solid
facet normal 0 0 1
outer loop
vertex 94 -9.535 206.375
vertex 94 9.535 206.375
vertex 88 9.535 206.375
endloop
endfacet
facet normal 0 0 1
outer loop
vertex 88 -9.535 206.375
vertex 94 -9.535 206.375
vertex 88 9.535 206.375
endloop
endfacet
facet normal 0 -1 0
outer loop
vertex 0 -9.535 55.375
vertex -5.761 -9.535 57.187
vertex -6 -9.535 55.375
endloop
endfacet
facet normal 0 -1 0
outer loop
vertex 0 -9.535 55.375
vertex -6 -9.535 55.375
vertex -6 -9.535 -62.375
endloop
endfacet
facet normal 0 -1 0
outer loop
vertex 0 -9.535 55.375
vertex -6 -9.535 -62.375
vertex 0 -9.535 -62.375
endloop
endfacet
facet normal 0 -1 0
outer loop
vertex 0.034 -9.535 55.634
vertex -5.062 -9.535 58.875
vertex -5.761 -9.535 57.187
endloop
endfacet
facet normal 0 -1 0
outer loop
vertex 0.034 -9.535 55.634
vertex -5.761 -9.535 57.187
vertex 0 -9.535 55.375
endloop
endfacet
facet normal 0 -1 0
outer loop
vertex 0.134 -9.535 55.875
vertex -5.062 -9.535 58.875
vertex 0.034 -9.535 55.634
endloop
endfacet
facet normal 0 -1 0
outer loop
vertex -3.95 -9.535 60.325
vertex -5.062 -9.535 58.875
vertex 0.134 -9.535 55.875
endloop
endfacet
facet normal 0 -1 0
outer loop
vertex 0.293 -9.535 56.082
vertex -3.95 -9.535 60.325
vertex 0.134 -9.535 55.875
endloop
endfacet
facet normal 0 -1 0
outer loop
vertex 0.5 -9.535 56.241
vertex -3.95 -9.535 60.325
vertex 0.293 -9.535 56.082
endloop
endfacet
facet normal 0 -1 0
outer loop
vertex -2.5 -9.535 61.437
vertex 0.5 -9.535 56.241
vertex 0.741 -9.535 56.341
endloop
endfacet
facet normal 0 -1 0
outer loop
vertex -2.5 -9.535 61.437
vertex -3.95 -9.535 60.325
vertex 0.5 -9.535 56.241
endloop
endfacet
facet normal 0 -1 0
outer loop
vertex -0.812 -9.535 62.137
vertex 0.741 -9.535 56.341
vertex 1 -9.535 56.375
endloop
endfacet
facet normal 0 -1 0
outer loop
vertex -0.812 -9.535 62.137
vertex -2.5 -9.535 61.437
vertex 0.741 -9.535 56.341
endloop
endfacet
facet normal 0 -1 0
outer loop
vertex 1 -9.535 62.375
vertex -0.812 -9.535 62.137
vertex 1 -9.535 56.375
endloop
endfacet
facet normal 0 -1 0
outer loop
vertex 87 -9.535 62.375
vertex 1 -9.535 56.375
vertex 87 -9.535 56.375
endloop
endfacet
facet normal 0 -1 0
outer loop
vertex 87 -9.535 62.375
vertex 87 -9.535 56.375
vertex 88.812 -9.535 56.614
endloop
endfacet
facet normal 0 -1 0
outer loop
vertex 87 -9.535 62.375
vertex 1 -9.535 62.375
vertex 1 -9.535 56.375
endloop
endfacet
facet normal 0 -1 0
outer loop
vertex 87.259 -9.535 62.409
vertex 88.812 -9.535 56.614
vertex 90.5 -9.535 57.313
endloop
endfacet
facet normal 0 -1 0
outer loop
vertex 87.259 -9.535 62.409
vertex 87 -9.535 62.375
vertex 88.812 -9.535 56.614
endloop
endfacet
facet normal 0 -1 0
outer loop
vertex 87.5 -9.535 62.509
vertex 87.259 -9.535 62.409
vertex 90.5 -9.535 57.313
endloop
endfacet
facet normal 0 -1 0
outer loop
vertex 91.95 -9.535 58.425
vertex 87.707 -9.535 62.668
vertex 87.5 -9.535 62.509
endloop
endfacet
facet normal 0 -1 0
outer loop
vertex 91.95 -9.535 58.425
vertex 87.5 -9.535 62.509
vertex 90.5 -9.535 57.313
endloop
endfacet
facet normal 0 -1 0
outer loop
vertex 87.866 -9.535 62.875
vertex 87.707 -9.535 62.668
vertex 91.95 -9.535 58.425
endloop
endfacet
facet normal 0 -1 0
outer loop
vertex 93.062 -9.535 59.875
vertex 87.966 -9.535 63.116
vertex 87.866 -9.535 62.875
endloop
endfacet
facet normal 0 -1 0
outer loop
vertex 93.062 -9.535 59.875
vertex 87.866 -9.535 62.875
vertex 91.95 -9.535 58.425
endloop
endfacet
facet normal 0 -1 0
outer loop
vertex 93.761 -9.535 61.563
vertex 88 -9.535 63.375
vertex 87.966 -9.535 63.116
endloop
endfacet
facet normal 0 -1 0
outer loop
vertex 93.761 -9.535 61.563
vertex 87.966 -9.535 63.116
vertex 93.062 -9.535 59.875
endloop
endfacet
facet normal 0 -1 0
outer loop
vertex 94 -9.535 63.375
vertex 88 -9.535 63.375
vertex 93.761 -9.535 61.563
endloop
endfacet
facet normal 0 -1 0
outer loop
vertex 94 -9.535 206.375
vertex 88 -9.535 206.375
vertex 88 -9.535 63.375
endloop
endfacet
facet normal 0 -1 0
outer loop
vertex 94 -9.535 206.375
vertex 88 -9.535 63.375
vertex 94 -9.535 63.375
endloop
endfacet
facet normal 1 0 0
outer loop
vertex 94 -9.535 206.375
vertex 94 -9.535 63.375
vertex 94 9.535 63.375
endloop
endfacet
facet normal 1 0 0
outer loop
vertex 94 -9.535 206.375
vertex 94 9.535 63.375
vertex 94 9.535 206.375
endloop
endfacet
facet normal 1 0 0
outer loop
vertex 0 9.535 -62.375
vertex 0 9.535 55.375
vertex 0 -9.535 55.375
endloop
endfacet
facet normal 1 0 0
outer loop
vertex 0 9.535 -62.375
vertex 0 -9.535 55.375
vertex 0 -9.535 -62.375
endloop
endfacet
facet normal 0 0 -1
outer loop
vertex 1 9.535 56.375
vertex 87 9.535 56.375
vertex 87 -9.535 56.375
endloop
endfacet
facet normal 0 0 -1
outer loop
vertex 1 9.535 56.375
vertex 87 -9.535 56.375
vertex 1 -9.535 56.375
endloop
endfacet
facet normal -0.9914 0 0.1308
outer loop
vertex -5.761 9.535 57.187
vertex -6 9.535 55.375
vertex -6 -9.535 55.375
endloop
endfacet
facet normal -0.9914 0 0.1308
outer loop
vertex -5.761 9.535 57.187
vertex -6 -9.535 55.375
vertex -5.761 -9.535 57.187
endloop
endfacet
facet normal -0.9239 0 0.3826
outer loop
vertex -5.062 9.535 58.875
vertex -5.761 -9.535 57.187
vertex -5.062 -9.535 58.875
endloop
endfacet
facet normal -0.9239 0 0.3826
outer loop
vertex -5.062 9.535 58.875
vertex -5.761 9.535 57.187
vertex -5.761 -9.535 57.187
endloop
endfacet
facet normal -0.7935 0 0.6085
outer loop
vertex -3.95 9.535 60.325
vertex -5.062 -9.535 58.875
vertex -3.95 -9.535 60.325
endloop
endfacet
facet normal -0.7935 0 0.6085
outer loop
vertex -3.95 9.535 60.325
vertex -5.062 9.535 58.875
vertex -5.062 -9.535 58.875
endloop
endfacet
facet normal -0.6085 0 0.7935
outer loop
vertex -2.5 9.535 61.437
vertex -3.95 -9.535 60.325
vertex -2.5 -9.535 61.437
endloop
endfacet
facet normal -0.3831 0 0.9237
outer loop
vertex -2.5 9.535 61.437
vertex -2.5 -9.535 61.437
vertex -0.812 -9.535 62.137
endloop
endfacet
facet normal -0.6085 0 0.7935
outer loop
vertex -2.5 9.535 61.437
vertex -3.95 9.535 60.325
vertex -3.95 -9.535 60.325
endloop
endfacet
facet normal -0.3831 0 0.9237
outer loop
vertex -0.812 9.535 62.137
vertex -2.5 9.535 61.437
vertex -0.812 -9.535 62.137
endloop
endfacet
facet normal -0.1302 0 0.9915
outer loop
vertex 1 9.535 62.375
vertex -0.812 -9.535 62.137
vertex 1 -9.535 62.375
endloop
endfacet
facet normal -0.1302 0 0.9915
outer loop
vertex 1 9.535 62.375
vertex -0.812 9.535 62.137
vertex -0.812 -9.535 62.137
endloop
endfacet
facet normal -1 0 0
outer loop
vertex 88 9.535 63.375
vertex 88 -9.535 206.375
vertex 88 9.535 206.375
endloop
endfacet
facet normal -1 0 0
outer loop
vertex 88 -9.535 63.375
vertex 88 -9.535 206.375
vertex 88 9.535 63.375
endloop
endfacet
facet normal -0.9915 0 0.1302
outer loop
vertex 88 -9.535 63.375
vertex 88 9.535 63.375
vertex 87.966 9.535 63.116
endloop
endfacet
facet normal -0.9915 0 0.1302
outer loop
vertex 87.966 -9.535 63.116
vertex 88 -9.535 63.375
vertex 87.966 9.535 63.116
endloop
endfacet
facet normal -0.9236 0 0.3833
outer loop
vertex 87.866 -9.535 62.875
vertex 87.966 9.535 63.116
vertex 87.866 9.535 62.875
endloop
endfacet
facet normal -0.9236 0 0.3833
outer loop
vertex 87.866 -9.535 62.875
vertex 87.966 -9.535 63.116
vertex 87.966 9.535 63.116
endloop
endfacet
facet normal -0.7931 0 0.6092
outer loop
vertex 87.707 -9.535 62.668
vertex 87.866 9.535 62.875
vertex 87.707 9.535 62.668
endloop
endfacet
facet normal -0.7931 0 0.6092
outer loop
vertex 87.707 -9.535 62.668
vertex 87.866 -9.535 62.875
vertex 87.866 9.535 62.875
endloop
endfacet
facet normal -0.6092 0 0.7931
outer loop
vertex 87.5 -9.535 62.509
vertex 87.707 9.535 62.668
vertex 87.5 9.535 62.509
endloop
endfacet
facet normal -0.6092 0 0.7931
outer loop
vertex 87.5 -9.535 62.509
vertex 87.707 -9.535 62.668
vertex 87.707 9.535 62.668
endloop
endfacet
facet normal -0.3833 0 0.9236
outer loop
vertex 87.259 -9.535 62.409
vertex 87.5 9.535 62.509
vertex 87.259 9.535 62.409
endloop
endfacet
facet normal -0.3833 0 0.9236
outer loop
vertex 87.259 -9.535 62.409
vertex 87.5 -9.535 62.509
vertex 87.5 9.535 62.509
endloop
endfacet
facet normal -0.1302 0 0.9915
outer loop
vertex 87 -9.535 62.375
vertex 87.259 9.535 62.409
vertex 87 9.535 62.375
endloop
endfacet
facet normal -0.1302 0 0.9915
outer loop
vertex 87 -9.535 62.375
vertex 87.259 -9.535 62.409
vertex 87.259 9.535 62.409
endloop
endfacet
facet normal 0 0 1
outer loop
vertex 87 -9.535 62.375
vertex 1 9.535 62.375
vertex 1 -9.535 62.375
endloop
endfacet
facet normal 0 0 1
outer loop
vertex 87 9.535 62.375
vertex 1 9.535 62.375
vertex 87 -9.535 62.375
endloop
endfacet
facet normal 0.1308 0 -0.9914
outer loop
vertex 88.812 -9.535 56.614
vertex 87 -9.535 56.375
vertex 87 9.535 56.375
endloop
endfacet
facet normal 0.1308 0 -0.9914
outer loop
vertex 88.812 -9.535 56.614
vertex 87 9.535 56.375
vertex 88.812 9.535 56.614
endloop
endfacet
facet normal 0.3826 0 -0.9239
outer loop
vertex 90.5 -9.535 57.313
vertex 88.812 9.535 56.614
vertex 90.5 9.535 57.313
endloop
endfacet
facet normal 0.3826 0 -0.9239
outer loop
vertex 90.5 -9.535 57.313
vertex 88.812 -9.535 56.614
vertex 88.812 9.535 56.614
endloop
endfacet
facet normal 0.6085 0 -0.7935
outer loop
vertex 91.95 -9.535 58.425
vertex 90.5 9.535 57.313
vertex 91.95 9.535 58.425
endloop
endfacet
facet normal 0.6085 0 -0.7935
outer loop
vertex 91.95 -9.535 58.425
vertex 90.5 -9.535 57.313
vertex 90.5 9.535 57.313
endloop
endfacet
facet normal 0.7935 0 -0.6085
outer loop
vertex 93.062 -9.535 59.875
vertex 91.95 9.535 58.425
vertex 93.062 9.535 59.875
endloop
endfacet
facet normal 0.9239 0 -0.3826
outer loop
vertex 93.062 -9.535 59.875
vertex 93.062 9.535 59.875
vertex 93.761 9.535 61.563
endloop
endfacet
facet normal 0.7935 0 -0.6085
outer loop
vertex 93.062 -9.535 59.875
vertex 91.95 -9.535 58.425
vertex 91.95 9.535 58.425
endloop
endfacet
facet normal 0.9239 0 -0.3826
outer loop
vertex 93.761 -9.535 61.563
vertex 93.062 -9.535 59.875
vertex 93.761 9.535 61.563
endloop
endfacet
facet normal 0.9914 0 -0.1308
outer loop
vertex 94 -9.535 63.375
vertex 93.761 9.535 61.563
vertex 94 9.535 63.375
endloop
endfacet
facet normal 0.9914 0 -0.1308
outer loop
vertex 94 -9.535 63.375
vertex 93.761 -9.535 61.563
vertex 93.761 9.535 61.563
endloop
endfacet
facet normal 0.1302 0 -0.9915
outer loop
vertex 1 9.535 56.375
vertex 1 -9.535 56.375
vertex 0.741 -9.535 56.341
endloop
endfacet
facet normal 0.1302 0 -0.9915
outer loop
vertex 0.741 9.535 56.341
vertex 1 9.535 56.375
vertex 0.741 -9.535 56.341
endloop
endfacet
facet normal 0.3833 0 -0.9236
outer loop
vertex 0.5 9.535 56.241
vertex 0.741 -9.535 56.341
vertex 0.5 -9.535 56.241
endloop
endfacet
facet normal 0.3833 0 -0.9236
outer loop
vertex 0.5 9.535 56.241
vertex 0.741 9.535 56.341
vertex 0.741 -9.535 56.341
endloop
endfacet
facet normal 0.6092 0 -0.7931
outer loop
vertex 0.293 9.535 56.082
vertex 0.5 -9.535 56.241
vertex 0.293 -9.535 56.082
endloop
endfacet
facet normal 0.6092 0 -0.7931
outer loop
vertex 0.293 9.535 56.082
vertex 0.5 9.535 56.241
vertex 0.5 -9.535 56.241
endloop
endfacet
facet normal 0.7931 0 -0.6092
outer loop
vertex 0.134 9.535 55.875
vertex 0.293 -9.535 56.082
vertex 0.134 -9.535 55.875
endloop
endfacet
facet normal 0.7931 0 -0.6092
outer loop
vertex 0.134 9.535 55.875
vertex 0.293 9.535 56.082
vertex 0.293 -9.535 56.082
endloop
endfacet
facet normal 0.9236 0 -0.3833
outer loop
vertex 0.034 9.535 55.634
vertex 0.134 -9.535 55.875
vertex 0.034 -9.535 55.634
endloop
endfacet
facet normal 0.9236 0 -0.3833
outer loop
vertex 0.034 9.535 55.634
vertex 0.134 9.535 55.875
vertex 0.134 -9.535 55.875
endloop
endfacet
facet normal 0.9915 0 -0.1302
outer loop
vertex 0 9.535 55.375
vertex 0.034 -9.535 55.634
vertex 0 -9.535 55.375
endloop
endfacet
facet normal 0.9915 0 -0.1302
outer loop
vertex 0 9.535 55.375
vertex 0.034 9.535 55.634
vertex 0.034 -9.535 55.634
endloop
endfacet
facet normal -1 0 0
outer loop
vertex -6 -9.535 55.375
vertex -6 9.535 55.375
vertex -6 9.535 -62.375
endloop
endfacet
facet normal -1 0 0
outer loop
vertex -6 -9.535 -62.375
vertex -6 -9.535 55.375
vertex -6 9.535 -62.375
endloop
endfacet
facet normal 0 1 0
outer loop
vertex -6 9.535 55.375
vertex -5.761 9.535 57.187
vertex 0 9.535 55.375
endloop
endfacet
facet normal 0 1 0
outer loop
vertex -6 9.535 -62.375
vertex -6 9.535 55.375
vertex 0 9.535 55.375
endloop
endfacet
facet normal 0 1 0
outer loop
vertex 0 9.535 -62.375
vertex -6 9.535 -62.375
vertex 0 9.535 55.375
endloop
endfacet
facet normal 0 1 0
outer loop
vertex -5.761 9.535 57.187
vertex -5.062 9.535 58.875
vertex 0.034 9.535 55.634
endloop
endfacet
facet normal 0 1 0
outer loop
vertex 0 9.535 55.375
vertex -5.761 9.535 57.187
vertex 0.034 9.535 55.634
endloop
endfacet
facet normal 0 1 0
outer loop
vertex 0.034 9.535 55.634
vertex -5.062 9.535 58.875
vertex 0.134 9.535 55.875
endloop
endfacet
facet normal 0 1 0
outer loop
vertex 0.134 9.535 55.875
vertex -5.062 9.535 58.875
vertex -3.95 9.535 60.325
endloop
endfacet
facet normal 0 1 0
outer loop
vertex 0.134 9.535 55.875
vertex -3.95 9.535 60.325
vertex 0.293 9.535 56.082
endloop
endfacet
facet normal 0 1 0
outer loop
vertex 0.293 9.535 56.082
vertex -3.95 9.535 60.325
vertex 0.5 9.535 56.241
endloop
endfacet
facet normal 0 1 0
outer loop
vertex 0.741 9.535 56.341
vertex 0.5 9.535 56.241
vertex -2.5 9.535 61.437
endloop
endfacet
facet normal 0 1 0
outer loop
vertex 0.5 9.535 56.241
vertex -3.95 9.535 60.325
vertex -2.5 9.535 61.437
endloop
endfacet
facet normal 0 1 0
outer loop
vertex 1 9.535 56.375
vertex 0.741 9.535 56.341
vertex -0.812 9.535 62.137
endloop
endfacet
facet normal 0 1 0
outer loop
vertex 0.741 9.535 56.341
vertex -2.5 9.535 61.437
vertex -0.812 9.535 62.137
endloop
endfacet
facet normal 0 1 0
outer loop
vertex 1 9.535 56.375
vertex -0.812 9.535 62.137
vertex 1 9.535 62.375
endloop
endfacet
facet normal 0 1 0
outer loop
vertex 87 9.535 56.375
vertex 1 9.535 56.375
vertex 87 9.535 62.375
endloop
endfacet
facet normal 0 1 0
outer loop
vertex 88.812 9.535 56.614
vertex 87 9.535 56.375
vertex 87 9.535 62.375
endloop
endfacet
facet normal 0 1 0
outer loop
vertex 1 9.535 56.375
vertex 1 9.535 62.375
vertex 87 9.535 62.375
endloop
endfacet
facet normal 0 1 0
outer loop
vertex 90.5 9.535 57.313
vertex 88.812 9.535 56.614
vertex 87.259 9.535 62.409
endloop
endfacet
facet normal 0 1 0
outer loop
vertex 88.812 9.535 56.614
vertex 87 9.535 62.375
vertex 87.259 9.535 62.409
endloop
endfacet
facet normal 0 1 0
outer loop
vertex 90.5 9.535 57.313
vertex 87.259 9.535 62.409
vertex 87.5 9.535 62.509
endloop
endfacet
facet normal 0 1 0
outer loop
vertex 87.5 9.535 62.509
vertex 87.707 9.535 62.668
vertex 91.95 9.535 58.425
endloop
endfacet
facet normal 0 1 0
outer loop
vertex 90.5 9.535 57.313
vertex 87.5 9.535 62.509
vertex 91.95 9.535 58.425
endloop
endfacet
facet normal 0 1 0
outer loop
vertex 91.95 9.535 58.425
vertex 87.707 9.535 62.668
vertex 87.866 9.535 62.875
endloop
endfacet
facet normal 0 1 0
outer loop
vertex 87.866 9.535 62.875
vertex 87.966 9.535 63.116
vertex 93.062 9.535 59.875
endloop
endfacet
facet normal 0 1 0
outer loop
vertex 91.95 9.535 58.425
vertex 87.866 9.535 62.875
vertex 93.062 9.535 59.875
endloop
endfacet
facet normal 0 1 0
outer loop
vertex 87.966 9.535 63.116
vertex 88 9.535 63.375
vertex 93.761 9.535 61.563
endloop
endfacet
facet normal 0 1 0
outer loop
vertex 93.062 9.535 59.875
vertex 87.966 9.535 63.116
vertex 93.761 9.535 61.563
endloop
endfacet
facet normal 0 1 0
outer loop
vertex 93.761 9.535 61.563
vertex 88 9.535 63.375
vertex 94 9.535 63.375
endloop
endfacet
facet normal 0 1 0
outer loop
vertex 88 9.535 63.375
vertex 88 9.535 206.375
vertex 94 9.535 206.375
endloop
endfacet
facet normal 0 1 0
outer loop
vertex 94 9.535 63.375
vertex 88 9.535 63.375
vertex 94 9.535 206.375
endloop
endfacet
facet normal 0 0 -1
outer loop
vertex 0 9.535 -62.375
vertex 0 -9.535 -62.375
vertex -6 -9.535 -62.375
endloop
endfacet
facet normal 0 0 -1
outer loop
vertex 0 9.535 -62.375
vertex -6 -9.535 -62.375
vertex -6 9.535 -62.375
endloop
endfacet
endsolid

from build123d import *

# Parameters (mm, degrees)
SKETCH1_W                    = 124.750351958
SKETCH1_H                    = 19.070117496
BASE_FLANGE1_DEPTH           = 6
EDGE_FLANGE1_STRIP_W         = 26
EDGE_FLANGE1_STRIP_H         = 6
EDGE_FLANGE1_STRIP_CUT_DEPTH = 19.070117497
EDGE_FLANGE1_DEPTH           = 19.070117497
EDGE_FLANGE2_STRIP_W         = 26
EDGE_FLANGE2_STRIP_H         = 6
EDGE_FLANGE2_STRIP_CUT_DEPTH = 19.070117497
EDGE_FLANGE2_DEPTH           = 19.070117497


# Sheet-metal steps are written as plain solids
with BuildPart() as part:
    # Sketch1 → Base-Flange1 (new body)
    with BuildSketch(Plane(origin=(0, 0, 0), x_dir=(0, 0, -1), z_dir=(1, 0, 0))):
        Rectangle(SKETCH1_W, SKETCH1_H)
    extrude(amount=-BASE_FLANGE1_DEPTH)

    # Edge-Flange1 strip (across the edge) → Edge-Flange1 strip cut (cut)
    with BuildSketch(Plane(origin=(0, 9.535058748, 62.375175979), x_dir=(0, 0, -1), z_dir=(0, -1, 0))):
        with Locations((-6, -3)):
            Rectangle(EDGE_FLANGE1_STRIP_W, EDGE_FLANGE1_STRIP_H)
    extrude(amount=EDGE_FLANGE1_STRIP_CUT_DEPTH, mode=Mode.SUBTRACT)

    # Edge-Flange1 section (across the edge) → Edge-Flange1 (add)
    with BuildSketch(Plane(origin=(0, 9.535058748, 62.375175979), x_dir=(0, 0, -1), z_dir=(0, -1, 0))):
        with BuildLine():
            Line((0, 1), (0, 94))
            Line((0, 94), (6, 94))
            Line((6, 94), (6, 1))
            ThreePointArc((6, 1), (6.292893219, 0.292893219), (7, 0))
            Line((7, 0), (7, -6))
            ThreePointArc((7, -6), (2.050252532, -3.949747468), (0, 1))
        make_face()
    extrude(amount=EDGE_FLANGE1_DEPTH)

    # Edge-Flange2 strip (across the edge) → Edge-Flange2 strip cut (cut)
    with BuildSketch(Plane(origin=(94, -9.535058748, 62.375175979), x_dir=(-1, 0, 0), z_dir=(0, 1, 0))):
        with Locations((-6, -3)):
            Rectangle(EDGE_FLANGE2_STRIP_W, EDGE_FLANGE2_STRIP_H)
    extrude(amount=EDGE_FLANGE2_STRIP_CUT_DEPTH, mode=Mode.SUBTRACT)

    # Edge-Flange2 section (across the edge) → Edge-Flange2 (add)
    with BuildSketch(Plane(origin=(94, -9.535058748, 62.375175979), x_dir=(-1, 0, 0), z_dir=(0, 1, 0))):
        with BuildLine():
            Line((0, 1), (0, 144))
            Line((0, 144), (6, 144))
            Line((6, 144), (6, 1))
            ThreePointArc((6, 1), (6.292893219, 0.292893219), (7, 0))
            Line((7, 0), (7, -6))
            ThreePointArc((7, -6), (2.050252532, -3.949747468), (0, 1))
        make_face()
    extrude(amount=EDGE_FLANGE2_DEPTH)


solid = part.part
